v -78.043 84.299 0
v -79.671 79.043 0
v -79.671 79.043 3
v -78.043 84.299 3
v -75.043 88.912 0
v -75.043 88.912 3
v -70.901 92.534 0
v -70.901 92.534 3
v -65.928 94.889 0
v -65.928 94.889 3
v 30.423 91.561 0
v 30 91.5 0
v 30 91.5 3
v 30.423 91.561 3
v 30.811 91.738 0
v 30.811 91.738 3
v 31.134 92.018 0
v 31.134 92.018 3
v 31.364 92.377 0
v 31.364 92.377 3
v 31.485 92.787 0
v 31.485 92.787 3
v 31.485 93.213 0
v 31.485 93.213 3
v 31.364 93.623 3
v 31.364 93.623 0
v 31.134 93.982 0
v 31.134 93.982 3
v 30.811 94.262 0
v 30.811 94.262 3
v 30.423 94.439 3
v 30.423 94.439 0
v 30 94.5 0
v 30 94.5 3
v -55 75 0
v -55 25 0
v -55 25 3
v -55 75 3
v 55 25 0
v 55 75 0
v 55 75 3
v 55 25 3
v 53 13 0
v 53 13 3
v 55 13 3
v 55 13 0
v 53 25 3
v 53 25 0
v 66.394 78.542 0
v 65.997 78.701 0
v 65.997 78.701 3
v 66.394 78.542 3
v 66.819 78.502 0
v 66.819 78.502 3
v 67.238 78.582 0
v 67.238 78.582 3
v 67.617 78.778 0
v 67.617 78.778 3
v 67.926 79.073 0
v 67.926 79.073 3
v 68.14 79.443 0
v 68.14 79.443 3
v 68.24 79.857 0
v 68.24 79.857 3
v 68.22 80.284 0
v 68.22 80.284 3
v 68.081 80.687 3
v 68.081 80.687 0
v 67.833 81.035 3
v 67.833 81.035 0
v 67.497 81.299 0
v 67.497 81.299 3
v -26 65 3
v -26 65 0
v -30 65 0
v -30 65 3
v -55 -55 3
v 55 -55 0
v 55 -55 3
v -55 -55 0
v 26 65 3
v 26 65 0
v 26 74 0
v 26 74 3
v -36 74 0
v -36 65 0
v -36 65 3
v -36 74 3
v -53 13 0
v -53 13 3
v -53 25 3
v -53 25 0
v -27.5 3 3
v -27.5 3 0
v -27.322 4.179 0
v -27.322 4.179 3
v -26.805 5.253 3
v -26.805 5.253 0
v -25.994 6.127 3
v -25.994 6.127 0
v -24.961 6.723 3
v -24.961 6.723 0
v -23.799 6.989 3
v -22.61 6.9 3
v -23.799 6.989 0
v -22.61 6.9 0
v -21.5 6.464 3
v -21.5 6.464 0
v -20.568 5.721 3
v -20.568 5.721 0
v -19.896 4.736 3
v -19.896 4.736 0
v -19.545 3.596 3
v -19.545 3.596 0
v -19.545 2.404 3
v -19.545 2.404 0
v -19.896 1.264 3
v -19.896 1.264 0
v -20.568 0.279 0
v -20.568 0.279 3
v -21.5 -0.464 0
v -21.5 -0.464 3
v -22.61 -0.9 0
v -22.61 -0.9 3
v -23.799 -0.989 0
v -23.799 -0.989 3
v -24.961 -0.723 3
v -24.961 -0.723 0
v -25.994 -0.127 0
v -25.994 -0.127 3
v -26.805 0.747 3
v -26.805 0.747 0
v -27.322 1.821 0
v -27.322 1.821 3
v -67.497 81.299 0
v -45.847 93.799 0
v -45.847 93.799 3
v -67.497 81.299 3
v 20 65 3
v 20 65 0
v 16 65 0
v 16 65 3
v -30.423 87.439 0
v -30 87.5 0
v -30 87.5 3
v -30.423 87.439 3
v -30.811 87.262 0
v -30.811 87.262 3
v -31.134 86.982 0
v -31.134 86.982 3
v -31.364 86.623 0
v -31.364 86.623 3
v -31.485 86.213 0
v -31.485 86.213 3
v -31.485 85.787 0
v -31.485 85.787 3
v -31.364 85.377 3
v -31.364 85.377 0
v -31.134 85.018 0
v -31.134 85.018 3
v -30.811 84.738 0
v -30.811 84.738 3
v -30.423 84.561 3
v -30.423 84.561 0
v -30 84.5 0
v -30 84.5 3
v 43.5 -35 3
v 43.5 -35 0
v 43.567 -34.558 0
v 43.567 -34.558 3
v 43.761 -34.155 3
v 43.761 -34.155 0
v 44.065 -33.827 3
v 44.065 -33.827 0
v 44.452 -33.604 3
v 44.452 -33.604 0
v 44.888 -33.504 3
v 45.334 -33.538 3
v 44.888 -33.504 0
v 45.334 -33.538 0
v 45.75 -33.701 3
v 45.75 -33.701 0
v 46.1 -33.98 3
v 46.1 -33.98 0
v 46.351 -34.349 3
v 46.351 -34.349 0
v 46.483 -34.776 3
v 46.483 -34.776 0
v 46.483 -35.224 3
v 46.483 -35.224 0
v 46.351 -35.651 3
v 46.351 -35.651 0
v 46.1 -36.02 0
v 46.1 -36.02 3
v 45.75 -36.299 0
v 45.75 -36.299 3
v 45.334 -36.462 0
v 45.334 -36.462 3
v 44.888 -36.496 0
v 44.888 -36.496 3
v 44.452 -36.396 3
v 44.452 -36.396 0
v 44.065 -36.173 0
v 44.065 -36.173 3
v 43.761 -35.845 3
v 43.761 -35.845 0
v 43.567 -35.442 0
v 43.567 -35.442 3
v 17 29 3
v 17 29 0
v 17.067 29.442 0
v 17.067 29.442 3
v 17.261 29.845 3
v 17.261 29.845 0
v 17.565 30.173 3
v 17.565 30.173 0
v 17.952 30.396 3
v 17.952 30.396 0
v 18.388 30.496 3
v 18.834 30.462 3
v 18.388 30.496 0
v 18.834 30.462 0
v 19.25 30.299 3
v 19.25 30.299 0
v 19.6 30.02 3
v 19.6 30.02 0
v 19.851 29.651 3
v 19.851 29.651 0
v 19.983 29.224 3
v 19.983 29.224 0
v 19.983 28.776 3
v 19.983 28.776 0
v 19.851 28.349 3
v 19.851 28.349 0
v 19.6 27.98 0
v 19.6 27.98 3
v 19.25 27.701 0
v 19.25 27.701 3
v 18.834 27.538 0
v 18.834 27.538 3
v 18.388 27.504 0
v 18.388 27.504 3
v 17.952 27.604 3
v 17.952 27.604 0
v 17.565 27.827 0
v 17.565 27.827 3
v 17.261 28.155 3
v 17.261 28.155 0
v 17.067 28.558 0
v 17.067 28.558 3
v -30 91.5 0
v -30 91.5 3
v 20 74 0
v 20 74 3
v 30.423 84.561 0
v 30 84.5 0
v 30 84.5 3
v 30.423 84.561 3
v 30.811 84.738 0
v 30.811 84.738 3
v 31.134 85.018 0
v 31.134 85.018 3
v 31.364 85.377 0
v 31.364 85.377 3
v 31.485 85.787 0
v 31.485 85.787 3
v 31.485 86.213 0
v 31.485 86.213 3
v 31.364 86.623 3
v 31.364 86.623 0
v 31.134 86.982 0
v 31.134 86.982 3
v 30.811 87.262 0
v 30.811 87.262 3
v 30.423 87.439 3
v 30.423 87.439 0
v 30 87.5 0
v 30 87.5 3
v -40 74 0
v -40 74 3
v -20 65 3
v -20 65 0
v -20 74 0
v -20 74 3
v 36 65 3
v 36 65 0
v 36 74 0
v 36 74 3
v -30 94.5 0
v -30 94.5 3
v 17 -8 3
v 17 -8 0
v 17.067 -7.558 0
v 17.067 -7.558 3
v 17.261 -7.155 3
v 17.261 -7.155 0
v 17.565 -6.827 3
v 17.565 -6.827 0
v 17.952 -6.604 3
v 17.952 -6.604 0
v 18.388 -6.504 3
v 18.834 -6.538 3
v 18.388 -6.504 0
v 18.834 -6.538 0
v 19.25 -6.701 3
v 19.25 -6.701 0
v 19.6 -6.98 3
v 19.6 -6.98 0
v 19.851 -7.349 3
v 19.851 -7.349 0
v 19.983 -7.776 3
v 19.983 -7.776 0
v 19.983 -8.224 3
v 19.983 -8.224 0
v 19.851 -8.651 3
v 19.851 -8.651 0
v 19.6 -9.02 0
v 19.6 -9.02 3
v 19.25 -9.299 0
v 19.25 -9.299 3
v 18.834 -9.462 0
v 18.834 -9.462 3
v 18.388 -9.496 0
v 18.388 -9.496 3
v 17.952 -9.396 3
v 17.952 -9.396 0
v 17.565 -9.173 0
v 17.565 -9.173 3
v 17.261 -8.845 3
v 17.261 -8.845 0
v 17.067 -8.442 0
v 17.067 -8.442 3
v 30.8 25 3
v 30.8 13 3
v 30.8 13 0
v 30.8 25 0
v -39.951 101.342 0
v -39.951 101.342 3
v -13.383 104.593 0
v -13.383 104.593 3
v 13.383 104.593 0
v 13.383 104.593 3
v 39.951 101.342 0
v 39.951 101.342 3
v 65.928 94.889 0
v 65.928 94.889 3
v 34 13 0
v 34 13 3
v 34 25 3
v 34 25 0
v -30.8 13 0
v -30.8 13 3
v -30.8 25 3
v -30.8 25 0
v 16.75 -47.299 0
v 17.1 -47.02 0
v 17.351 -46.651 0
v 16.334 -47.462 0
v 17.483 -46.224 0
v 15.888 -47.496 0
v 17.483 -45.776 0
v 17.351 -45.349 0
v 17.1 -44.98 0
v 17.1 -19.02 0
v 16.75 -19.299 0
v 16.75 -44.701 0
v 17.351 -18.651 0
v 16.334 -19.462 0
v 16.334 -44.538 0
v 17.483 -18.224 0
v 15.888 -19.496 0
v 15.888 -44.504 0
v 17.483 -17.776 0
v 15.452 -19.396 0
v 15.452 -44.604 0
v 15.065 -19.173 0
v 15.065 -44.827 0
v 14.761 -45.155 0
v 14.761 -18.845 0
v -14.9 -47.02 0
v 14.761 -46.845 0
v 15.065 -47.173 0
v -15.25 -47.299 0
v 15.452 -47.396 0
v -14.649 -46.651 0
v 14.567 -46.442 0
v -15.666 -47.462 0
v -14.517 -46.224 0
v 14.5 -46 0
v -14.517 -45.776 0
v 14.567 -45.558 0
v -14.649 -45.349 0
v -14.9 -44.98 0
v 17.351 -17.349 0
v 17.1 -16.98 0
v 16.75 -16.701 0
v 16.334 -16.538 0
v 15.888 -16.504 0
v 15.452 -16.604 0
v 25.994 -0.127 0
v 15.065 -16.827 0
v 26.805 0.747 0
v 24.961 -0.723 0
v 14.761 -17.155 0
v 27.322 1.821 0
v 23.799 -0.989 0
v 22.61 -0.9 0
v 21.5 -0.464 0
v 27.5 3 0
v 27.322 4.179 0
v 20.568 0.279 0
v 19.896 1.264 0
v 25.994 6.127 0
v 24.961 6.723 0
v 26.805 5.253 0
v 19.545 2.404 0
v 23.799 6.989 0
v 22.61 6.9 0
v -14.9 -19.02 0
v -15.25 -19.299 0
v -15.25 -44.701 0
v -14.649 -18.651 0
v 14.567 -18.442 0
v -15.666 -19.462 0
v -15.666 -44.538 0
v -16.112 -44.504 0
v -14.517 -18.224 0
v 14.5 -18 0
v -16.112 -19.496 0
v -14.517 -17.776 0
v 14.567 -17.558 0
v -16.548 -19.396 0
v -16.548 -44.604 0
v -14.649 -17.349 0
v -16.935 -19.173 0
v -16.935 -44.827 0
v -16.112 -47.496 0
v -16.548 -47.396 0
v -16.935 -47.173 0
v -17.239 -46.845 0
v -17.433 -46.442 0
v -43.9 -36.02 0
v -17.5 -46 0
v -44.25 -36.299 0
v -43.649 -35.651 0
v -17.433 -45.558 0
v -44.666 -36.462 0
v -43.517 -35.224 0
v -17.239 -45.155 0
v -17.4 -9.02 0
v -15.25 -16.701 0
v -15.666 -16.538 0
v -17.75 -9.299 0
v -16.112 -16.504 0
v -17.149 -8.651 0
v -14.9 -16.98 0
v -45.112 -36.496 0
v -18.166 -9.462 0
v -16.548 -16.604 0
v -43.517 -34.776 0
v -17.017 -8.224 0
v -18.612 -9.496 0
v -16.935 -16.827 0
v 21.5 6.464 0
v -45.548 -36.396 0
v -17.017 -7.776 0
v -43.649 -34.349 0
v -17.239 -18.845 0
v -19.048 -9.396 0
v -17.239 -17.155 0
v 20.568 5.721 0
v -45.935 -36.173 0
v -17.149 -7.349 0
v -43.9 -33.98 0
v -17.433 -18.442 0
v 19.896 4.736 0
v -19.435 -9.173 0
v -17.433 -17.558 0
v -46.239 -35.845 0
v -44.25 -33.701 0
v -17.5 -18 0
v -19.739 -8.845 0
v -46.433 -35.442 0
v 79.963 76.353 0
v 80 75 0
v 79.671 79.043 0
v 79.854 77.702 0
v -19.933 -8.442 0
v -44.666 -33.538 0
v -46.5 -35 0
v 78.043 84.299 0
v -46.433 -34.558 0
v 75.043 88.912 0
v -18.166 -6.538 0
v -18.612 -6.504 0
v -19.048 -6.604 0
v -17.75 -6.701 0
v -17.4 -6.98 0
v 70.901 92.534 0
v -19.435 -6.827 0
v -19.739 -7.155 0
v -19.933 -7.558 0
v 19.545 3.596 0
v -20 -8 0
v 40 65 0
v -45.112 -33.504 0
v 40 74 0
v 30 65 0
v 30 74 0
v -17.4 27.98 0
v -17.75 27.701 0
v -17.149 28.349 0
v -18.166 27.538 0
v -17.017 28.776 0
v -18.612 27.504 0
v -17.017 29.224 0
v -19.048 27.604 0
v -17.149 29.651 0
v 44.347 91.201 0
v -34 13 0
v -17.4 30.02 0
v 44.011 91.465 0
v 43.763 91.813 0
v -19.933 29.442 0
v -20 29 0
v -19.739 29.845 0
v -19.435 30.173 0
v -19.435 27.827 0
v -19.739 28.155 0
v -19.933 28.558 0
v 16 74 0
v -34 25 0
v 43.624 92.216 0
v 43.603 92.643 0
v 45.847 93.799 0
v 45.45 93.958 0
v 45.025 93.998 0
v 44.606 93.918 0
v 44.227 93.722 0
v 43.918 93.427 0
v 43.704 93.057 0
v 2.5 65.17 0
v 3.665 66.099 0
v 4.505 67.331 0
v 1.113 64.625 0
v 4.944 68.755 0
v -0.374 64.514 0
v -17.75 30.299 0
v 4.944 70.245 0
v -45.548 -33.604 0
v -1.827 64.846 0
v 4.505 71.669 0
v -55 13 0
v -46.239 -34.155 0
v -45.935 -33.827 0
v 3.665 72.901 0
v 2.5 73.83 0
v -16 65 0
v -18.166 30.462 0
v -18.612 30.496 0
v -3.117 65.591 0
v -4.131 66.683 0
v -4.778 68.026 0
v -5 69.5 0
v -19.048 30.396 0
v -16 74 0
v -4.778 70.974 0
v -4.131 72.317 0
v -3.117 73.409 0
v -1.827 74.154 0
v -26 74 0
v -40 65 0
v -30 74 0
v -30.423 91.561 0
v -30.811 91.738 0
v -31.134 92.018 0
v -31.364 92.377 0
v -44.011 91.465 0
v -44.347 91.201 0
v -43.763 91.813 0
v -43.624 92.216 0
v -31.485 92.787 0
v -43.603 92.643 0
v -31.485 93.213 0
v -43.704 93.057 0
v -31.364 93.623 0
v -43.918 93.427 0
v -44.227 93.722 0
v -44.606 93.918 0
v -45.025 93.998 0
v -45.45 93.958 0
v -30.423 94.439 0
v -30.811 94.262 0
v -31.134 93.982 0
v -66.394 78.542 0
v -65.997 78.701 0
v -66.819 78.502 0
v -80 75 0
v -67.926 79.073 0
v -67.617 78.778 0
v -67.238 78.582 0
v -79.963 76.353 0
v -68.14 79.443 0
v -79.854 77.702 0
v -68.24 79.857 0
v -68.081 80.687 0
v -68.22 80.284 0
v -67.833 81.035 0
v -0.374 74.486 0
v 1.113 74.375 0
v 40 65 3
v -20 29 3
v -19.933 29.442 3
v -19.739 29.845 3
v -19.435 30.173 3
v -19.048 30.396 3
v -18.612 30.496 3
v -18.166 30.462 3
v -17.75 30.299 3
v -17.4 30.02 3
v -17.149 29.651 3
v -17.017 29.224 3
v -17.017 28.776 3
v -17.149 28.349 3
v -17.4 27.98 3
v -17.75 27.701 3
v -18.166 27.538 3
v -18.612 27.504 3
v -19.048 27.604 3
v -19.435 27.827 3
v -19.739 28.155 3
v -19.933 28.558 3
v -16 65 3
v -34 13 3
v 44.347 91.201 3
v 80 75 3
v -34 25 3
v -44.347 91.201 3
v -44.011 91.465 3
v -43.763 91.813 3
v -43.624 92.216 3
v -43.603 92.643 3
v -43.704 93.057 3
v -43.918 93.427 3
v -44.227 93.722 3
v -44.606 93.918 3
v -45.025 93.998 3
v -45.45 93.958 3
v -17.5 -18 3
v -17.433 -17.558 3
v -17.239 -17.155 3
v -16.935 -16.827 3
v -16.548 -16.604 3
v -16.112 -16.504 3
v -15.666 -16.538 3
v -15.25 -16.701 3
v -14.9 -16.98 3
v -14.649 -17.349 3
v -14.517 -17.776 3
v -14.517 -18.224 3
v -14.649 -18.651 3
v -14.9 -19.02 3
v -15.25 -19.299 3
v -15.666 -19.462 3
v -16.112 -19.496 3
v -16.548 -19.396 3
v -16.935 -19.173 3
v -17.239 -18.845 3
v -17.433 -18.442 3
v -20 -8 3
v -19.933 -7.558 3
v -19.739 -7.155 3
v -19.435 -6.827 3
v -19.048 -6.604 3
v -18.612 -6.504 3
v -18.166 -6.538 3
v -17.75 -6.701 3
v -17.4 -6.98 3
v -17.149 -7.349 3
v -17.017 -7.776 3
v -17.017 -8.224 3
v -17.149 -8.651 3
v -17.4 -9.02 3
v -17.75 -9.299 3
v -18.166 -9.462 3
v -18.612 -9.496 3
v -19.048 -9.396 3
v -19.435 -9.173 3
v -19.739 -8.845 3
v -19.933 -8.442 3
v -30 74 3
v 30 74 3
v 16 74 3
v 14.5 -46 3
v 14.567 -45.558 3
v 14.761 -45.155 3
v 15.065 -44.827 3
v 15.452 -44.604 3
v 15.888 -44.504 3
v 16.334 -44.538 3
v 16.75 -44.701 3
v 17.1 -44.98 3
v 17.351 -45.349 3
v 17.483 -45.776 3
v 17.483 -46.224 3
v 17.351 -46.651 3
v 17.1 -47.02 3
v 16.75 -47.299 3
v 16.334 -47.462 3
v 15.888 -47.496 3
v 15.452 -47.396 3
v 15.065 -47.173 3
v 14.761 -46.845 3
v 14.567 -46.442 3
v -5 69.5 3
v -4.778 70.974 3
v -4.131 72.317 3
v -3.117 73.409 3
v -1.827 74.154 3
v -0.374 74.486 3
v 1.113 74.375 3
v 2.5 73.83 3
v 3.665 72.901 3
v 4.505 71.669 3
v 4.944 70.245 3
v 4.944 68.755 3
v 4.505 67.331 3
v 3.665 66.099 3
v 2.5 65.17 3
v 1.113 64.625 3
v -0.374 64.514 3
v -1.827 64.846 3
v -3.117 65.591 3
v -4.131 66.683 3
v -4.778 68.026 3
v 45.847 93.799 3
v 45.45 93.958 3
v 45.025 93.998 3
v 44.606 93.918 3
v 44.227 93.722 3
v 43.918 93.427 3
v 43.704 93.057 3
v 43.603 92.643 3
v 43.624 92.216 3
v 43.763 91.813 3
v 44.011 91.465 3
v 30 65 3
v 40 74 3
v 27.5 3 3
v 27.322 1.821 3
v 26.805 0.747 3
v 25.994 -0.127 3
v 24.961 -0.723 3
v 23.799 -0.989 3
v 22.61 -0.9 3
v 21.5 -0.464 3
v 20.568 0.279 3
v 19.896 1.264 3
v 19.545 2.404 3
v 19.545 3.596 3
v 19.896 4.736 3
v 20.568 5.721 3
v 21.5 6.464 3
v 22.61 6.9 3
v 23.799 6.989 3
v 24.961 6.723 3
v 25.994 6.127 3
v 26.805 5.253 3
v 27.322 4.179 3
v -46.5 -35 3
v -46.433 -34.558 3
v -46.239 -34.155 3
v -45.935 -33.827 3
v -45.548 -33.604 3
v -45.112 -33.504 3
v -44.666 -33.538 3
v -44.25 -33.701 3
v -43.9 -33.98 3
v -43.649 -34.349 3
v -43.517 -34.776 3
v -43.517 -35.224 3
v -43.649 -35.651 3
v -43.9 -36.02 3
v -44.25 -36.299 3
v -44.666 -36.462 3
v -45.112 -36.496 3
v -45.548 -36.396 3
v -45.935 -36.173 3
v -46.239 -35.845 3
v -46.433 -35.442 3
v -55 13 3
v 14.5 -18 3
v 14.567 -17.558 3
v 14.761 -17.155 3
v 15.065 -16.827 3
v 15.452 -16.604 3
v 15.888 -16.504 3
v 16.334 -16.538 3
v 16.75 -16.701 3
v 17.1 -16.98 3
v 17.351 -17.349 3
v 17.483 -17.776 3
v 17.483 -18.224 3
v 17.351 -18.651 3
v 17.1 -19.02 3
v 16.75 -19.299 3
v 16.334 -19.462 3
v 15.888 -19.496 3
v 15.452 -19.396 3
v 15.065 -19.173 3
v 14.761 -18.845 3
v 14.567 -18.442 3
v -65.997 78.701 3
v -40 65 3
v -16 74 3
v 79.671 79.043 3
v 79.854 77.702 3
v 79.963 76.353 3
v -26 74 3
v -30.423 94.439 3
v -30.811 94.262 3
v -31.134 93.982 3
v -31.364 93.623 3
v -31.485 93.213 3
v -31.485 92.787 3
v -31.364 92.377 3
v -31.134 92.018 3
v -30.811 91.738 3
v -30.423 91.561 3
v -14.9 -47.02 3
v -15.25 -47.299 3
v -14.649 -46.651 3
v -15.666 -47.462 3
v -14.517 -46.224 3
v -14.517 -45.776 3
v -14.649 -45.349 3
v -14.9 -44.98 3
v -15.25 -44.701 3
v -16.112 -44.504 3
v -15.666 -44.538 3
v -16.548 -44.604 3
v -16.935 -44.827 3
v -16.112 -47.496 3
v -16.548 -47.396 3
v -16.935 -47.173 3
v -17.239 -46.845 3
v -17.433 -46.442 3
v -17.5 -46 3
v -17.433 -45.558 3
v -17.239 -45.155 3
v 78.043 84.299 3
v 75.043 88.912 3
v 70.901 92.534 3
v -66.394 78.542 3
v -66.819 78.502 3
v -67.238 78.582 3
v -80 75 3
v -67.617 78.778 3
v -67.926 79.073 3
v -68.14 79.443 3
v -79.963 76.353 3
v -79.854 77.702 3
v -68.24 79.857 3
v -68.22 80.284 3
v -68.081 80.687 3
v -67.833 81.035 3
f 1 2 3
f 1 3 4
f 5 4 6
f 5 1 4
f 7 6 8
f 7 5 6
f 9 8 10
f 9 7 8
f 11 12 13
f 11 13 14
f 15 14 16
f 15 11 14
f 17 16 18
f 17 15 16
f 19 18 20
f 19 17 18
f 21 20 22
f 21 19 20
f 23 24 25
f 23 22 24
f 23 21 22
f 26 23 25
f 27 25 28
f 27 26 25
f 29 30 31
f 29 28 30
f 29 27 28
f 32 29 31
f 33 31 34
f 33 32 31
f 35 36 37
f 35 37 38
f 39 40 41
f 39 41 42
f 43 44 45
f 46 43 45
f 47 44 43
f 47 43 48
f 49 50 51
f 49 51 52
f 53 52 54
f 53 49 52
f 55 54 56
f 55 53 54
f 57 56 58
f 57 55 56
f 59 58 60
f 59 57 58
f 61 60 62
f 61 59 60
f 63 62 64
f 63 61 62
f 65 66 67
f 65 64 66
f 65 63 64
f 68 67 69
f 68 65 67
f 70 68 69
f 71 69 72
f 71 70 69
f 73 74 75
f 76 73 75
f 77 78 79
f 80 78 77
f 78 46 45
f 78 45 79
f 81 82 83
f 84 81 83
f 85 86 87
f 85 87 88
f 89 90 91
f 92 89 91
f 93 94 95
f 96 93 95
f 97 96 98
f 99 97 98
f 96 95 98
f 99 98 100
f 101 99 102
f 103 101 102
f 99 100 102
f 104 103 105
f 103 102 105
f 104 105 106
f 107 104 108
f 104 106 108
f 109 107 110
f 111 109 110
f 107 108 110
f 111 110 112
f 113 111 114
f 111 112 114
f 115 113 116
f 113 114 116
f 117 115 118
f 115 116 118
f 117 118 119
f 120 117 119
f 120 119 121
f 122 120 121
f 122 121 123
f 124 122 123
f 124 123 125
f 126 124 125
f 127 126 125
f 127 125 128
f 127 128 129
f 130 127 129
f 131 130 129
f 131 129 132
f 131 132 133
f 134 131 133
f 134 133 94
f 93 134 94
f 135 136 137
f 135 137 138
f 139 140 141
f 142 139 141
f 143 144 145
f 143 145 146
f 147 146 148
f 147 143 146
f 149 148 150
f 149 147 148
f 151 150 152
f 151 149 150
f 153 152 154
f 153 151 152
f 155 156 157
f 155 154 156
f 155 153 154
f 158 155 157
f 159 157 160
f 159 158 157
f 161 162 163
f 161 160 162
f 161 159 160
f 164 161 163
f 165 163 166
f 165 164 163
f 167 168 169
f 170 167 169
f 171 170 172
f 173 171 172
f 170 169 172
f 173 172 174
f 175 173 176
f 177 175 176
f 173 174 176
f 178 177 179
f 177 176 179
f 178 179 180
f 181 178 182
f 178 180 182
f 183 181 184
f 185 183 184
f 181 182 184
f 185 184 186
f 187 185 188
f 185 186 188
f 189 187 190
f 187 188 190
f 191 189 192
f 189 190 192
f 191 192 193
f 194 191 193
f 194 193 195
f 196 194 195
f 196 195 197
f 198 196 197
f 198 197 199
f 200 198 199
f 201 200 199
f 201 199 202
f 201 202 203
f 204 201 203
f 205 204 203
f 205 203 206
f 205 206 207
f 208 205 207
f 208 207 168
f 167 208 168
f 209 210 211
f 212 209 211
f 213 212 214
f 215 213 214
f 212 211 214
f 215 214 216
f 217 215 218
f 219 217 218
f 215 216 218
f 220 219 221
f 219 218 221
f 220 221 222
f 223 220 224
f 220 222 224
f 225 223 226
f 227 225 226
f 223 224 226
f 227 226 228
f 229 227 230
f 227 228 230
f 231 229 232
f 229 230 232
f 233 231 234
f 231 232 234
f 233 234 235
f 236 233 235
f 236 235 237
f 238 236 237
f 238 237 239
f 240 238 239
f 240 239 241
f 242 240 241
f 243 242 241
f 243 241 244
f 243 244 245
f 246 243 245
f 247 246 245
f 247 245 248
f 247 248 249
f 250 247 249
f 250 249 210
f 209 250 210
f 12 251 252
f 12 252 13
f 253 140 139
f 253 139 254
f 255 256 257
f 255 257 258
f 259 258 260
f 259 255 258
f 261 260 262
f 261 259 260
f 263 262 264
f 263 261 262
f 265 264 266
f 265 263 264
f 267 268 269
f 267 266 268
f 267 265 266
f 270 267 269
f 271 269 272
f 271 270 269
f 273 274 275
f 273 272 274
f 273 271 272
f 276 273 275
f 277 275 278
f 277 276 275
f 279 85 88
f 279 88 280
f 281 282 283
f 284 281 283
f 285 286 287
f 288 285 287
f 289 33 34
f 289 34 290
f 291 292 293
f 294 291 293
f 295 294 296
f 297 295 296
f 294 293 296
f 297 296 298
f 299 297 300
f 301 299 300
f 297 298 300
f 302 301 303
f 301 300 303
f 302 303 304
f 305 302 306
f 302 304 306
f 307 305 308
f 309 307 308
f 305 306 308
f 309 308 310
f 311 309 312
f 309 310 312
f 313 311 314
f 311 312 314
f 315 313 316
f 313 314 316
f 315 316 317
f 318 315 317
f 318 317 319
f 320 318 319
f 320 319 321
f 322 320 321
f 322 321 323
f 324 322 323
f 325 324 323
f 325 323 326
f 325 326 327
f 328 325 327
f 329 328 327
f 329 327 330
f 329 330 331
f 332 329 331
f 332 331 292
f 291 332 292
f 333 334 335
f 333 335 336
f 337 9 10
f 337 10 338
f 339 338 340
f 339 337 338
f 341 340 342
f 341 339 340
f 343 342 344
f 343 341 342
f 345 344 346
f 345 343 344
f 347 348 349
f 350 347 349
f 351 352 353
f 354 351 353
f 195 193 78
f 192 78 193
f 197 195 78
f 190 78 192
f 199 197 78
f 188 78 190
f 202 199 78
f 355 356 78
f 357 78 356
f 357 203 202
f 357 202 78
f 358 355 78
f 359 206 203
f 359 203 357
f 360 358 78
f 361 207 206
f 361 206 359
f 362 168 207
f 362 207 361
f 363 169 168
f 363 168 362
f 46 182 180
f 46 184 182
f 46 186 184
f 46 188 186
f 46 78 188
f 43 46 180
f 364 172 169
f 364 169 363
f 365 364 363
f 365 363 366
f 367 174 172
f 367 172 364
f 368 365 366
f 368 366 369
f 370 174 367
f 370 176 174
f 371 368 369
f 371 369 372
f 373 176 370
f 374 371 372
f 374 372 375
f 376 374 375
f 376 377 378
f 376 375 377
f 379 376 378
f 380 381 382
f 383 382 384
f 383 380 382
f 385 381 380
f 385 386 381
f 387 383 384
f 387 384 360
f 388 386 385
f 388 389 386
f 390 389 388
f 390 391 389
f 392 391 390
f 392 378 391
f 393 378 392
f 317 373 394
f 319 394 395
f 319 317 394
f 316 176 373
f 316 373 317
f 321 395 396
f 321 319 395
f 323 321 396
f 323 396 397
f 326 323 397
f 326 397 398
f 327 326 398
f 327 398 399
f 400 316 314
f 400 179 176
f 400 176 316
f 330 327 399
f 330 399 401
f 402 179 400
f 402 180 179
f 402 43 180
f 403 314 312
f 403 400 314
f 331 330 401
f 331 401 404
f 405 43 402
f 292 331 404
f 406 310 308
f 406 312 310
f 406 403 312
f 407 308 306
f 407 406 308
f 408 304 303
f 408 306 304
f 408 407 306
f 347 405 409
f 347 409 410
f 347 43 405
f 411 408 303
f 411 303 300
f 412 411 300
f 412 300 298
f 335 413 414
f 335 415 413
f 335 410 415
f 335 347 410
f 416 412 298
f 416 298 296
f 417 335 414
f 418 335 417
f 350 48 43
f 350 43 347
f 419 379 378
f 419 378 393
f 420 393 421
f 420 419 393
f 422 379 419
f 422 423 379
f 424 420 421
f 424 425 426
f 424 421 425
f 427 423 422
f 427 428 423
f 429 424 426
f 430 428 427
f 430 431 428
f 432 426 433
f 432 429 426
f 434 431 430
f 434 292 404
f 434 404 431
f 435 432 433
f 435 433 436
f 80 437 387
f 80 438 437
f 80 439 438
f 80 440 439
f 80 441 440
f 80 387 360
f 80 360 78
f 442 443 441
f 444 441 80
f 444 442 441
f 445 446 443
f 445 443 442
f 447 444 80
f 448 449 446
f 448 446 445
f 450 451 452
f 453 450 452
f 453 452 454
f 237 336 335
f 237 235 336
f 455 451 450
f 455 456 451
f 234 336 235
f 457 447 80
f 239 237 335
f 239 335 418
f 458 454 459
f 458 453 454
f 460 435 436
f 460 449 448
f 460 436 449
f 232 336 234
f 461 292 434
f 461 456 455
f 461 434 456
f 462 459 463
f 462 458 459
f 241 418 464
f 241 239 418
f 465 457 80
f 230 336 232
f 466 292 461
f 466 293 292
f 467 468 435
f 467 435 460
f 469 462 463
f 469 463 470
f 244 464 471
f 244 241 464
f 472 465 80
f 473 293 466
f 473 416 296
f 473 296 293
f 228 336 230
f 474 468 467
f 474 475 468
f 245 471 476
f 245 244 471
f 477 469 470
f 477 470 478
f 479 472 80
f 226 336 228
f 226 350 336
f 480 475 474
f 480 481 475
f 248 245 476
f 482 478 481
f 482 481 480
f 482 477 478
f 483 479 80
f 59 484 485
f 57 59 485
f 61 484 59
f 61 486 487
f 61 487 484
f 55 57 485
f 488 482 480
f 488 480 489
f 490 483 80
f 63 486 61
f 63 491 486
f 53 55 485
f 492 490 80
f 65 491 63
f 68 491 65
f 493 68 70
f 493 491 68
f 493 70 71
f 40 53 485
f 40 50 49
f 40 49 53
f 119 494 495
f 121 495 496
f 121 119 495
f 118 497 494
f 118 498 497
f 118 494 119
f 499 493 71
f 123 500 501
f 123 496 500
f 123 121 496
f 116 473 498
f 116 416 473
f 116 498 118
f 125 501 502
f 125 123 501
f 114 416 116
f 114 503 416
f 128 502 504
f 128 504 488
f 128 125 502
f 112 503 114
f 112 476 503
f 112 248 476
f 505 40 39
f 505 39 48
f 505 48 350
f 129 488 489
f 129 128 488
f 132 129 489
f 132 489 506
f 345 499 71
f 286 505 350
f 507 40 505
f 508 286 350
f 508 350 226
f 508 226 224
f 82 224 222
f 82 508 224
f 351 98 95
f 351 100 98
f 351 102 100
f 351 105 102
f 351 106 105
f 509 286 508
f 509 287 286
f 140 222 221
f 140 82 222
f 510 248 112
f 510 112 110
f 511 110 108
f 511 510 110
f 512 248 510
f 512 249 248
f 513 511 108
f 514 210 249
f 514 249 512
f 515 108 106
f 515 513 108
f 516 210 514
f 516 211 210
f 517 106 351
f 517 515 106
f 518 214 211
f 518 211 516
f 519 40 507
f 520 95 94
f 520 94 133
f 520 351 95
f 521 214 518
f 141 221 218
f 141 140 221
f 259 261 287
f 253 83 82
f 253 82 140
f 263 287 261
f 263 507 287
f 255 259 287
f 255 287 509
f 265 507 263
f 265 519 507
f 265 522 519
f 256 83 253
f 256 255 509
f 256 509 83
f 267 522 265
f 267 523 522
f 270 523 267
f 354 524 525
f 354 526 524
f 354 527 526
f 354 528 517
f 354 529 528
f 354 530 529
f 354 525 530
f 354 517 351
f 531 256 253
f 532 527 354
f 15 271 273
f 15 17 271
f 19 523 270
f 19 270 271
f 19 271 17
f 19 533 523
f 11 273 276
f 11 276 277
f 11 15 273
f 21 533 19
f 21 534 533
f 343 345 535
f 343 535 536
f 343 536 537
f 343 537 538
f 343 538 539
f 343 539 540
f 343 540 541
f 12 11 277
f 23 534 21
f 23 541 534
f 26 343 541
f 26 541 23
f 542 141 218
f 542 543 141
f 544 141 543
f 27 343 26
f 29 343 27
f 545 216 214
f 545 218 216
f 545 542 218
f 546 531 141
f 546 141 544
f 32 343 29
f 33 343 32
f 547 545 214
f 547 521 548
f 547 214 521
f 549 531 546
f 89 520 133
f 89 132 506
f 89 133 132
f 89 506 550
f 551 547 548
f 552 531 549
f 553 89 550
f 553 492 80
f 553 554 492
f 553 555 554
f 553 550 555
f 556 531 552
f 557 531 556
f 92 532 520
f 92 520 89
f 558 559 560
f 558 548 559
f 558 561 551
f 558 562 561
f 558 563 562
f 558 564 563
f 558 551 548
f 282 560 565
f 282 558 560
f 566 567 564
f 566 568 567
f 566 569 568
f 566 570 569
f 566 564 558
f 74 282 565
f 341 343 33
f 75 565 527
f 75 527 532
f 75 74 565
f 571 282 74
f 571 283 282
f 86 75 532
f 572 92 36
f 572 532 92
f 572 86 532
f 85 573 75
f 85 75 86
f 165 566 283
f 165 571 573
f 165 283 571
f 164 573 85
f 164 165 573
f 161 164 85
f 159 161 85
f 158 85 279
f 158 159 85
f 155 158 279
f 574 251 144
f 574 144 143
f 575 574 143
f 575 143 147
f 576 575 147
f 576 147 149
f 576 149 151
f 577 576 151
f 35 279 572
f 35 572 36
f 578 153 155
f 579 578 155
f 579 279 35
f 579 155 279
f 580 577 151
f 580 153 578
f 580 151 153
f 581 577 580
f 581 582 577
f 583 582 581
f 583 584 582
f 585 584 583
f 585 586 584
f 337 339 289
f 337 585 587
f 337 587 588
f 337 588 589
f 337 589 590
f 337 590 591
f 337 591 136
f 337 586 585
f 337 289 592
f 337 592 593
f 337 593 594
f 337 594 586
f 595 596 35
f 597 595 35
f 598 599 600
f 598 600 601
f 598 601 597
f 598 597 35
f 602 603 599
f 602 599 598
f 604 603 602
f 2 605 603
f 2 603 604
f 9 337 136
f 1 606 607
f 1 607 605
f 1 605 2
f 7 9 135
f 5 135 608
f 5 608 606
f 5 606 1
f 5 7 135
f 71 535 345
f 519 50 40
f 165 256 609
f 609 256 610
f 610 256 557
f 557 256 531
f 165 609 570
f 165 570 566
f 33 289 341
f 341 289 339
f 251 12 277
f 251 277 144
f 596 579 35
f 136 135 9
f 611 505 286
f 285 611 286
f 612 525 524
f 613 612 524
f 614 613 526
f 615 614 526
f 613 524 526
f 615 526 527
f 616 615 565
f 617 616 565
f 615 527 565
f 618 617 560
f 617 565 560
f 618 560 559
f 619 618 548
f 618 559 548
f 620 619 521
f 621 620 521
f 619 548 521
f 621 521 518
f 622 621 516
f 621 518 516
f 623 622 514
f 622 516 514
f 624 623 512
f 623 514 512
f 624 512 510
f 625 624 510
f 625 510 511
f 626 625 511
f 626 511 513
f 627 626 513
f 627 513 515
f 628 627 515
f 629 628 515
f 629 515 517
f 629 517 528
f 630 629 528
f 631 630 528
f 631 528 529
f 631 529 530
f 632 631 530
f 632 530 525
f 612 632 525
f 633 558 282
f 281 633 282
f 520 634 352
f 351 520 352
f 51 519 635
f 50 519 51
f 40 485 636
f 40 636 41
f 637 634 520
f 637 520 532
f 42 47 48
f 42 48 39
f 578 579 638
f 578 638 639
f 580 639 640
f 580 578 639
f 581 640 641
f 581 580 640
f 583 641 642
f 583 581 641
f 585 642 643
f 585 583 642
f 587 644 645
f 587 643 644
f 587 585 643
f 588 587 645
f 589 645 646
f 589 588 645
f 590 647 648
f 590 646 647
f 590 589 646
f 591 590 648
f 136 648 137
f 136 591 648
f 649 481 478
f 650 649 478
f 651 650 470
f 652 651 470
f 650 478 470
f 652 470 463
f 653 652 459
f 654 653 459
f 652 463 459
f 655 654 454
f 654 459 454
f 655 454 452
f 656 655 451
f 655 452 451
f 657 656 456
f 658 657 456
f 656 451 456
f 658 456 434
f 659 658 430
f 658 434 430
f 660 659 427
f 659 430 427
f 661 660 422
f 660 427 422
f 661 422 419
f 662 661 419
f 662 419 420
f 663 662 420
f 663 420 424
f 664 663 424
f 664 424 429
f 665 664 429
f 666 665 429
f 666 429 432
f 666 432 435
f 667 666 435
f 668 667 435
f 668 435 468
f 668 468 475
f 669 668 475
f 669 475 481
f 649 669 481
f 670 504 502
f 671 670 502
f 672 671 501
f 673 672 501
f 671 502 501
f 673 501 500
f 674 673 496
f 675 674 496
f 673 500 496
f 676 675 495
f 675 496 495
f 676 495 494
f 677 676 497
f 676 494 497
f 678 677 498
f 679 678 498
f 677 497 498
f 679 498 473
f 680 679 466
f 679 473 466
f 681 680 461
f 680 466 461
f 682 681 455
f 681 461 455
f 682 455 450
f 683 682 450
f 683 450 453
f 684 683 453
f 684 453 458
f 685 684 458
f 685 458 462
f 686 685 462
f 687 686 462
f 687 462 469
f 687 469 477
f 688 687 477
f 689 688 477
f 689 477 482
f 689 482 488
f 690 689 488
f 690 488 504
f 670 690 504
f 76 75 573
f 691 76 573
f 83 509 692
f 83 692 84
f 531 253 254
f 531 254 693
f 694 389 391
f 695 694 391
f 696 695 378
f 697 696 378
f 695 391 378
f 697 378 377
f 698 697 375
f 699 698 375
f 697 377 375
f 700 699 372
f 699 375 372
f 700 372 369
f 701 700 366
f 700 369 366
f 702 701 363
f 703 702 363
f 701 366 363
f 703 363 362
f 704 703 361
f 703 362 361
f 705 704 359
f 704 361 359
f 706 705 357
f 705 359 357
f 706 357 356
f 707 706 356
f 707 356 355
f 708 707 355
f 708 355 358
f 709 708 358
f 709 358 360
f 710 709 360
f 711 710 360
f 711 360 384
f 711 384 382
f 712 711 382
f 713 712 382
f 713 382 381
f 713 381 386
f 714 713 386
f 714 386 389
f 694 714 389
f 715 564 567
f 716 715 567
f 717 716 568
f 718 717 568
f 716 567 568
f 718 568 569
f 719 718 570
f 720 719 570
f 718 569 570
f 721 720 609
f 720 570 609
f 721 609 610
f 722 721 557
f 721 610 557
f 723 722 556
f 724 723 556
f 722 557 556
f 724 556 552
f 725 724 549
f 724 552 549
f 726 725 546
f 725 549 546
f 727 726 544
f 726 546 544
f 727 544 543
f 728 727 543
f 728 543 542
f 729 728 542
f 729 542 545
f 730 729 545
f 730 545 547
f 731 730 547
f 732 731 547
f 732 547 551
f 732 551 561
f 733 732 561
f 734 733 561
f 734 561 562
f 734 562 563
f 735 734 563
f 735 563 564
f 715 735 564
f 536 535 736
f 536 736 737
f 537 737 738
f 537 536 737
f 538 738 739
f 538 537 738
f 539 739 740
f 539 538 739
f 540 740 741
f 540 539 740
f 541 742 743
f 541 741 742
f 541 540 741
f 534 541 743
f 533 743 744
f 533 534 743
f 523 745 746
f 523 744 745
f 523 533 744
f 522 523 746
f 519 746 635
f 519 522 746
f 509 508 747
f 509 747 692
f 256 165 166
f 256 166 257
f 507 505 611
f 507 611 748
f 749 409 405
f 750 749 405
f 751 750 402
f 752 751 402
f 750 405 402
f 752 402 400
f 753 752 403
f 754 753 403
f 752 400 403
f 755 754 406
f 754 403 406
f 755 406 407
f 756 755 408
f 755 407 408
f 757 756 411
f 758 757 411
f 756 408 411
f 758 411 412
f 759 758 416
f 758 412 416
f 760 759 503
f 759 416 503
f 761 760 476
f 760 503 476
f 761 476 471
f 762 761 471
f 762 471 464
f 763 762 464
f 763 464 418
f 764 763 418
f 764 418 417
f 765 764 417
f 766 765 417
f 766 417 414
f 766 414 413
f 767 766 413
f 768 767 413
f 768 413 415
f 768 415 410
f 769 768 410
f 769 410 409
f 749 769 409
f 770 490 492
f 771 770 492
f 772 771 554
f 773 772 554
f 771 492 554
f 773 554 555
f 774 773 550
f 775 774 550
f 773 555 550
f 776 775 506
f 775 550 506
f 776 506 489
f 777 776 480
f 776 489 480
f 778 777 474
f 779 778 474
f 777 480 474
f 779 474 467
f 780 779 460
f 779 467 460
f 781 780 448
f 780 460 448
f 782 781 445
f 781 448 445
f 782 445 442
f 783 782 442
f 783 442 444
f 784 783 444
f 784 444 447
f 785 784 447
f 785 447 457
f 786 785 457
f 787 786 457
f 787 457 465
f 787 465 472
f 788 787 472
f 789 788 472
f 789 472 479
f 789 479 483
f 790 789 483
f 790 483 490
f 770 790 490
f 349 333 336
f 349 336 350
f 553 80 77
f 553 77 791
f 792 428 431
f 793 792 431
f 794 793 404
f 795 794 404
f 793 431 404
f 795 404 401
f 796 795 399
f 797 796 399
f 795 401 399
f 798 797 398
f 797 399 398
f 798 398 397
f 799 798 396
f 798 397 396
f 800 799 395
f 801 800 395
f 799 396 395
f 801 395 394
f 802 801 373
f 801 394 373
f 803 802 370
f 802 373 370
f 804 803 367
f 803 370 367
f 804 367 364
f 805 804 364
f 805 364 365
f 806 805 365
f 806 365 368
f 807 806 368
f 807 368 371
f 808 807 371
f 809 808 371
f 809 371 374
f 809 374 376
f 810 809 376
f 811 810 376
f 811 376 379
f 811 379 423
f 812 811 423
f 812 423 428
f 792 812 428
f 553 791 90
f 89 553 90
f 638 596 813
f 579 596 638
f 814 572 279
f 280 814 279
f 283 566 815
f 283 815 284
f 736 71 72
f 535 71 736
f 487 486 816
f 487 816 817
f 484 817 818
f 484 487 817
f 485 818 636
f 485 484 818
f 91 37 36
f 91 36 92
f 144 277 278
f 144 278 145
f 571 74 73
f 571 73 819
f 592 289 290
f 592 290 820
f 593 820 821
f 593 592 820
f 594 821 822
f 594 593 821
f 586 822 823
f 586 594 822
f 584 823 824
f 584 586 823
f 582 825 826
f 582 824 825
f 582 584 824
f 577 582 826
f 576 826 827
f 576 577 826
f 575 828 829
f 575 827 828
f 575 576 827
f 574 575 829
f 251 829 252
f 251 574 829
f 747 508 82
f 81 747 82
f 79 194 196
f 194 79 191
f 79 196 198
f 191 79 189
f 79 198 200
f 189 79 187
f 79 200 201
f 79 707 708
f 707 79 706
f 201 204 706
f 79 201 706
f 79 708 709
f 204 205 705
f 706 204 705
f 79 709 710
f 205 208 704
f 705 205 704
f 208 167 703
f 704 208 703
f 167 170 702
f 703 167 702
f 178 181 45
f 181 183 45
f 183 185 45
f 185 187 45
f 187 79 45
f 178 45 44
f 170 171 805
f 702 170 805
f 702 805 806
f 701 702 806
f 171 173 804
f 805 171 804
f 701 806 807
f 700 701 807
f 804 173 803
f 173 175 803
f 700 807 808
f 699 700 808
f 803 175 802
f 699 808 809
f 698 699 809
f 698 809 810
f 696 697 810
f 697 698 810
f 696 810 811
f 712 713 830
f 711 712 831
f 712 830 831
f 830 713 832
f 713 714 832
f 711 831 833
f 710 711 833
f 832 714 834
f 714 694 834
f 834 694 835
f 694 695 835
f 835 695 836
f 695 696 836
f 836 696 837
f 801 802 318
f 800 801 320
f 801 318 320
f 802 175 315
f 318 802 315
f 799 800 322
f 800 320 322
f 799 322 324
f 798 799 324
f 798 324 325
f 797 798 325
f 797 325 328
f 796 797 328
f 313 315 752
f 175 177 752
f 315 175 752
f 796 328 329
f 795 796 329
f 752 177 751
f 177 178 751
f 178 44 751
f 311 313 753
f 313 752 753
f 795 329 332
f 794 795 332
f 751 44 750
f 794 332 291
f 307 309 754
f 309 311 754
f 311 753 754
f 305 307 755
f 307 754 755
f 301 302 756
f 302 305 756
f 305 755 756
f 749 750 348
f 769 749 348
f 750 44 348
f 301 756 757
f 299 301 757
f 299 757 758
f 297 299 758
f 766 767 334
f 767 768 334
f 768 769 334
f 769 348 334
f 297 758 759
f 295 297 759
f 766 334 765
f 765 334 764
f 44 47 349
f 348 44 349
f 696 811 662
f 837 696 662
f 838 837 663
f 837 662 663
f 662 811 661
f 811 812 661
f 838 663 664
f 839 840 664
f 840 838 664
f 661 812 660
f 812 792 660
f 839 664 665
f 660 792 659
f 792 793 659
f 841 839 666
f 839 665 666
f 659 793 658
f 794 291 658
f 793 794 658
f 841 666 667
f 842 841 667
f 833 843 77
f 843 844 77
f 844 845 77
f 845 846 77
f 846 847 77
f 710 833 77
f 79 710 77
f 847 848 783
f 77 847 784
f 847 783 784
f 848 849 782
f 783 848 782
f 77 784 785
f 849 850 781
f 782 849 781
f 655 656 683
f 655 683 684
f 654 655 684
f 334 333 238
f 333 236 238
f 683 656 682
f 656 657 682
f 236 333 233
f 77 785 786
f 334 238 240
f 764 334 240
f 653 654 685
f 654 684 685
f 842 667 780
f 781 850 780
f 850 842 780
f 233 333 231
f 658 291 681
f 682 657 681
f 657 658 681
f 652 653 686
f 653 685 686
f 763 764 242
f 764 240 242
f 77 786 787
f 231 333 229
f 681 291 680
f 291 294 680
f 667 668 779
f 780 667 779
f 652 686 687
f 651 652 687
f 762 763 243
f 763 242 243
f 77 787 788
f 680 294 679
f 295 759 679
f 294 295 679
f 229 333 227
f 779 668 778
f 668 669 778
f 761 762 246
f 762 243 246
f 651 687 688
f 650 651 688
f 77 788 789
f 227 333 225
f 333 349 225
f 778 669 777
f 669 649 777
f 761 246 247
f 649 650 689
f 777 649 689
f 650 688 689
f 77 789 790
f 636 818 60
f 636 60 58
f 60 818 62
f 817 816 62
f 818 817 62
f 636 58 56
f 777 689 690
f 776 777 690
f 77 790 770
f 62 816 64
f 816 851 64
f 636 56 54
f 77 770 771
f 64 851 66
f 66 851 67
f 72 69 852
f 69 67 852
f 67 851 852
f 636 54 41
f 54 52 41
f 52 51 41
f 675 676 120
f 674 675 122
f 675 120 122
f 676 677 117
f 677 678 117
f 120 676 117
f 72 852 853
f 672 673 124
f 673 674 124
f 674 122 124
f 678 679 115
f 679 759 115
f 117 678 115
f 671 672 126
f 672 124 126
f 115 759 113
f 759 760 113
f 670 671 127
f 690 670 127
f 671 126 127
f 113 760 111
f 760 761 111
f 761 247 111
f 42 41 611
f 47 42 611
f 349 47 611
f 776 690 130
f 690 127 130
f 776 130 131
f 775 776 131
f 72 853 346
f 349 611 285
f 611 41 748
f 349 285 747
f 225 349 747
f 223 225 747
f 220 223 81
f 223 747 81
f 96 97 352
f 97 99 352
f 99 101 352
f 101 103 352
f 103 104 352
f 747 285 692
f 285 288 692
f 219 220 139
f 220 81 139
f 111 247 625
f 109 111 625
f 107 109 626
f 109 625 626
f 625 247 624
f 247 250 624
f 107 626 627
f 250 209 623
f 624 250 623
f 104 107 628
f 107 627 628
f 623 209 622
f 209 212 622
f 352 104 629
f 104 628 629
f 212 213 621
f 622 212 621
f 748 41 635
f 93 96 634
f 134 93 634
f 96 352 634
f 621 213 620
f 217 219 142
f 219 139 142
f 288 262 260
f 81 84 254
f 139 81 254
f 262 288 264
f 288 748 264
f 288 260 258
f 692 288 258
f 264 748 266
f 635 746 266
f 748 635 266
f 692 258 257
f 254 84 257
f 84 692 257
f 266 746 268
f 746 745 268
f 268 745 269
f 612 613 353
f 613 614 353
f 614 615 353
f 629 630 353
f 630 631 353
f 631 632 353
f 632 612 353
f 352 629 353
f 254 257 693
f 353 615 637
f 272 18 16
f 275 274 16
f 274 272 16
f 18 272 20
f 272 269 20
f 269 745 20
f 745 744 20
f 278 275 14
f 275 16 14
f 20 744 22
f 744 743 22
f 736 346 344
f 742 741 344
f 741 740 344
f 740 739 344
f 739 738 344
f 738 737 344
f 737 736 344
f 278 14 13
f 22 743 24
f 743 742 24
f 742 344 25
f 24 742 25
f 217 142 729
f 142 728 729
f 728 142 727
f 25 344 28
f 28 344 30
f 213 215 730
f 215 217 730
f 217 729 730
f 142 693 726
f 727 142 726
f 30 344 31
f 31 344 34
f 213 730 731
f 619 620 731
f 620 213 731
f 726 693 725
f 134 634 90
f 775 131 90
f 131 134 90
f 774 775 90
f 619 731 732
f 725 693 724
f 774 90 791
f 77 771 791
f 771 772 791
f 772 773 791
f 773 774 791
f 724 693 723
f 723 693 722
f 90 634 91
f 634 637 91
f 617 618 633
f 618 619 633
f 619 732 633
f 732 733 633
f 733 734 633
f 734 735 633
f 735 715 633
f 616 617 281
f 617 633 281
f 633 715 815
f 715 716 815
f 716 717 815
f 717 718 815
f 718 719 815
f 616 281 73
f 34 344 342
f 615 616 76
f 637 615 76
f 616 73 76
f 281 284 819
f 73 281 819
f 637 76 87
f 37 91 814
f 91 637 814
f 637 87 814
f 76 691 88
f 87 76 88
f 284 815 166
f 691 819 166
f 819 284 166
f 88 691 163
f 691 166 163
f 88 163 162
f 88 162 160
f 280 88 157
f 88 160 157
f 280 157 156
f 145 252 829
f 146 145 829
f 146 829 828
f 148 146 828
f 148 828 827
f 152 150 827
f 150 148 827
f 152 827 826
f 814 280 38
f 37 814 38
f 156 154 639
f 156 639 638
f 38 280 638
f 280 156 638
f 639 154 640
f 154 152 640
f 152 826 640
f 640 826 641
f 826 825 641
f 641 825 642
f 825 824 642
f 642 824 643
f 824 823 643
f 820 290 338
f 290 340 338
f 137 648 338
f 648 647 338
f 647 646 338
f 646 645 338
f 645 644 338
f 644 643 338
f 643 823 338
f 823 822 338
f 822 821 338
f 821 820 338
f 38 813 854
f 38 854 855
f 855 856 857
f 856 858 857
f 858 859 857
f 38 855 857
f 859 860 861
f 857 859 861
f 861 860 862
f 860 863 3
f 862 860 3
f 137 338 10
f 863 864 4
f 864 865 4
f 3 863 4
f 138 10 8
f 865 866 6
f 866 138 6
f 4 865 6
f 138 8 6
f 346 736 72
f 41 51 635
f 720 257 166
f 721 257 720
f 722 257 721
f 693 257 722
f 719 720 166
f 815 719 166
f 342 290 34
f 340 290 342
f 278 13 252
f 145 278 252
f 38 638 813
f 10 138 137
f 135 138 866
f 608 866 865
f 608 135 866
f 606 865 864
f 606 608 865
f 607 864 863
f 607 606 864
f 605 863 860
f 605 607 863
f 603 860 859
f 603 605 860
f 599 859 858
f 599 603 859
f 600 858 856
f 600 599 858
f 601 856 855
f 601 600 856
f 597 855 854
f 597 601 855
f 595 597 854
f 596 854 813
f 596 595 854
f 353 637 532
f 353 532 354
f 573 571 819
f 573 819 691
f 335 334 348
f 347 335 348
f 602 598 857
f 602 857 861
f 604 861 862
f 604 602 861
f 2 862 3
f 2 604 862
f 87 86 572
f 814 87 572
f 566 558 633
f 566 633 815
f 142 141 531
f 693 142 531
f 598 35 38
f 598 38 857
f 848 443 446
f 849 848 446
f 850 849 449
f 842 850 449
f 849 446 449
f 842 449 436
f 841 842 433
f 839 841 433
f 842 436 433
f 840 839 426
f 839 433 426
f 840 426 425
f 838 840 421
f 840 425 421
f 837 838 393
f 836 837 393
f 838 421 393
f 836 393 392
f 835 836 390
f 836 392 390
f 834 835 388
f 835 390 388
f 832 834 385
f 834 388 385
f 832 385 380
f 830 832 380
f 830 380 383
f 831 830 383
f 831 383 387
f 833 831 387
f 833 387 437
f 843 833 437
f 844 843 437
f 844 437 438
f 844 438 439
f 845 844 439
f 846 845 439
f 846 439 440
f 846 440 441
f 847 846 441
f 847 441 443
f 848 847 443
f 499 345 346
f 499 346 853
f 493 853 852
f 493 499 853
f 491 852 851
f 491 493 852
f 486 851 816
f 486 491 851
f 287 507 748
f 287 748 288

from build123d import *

# Parameters (mm, degrees)
EXTRUDE_1_DEPTH     = 3
CUT_EXTRUDE_1_DEPTH = 133.037873355
SKETCH_3_W          = 2
SKETCH_3_H          = 12
SKETCH_3_W_2        = 3.2
CUT_EXTRUDE_2_DEPTH = 133.037873355
SKETCH_4_R          = 4
CUT_EXTRUDE_3_DEPTH = 133.037873355
SKETCH_5_R          = 5
SKETCH_5_W          = 4
SKETCH_5_H          = 9
CUT_EXTRUDE_4_DEPTH = 133.037873355
SKETCH_6_R          = 1.5
CUT_EXTRUDE_5_DEPTH = 10
SKETCH_8_R          = 1.5
CUT_EXTRUDE_7_DEPTH = 133.037873355
SKETCH_9_R          = 1.5
CUT_EXTRUDE_8_DEPTH = 133.037873355


with BuildPart() as part:
    # 草图1 → 凸台-拉伸1 (new body)
    with BuildSketch(Plane.XY):
        with BuildLine():
            Line((55, -55), (-55, -55))
            Line((-55, -55), (-55, 75))
            Line((-55, 75), (-80, 75))
            ThreePointArc((-80, 75), (-79.917609458, 77.027988882), (-79.670980888, 79.042610796))
            ThreePointArc((-79.670980888, 79.042610796), (-75.043492411, 88.912306625), (-65.927615795, 94.889374375))
            ThreePointArc((-65.927615795, 94.889374375), (0, 105), (65.927615795, 94.889374375))
            ThreePointArc((65.927615795, 94.889374375), (75.043492411, 88.912306625), (79.670980888, 79.042610796))
            ThreePointArc((79.670980888, 79.042610796), (79.917609458, 77.027988882), (80, 75))
            Line((80, 75), (55, 75))
            Line((55, 75), (55, -55))
        make_face()
    extrude(amount=EXTRUDE_1_DEPTH)

    # 草图2 → 切除-拉伸1 (cut, through all)
    with BuildSketch(Plane(origin=(0, 0, 0), x_dir=(-1, 0, 0), z_dir=(0, 0, -1))):
        with BuildLine():
            Line((-30, 94.5), (30, 94.5))
            ThreePointArc((30, 94.5), (31.5, 93), (30, 91.5))
            Line((30, 91.5), (-30, 91.5))
            ThreePointArc((-30, 91.5), (-31.5, 93), (-30, 94.5))
        make_face()
        with BuildLine():
            Line((-67.497284367, 81.299038106), (-45.846649273, 93.799038106))
            ThreePointArc((-45.846649273, 93.799038106), (-43.797611167, 93.25), (-44.346649273, 91.200961894))
            Line((-44.346649273, 91.200961894), (-65.997284367, 78.700961894))
            ThreePointArc((-65.997284367, 78.700961894), (-68.046322473, 79.25), (-67.497284367, 81.299038106))
        make_face()
        with BuildLine():
            Line((65.997284367, 78.700961894), (44.346649273, 91.200961894))
            ThreePointArc((44.346649273, 91.200961894), (43.797611167, 93.25), (45.846649273, 93.799038106))
            Line((45.846649273, 93.799038106), (67.497284367, 81.299038106))
            ThreePointArc((67.497284367, 81.299038106), (68.046322473, 79.25), (65.997284367, 78.700961894))
        make_face()
        with BuildLine():
            Line((-30, 87.5), (30, 87.5))
            ThreePointArc((30, 87.5), (31.5, 86), (30, 84.5))
            Line((30, 84.5), (-30, 84.5))
            ThreePointArc((-30, 84.5), (-31.5, 86), (-30, 87.5))
        make_face()
    extrude(amount=-CUT_EXTRUDE_1_DEPTH, mode=Mode.SUBTRACT)

    # 草图3 → 切除-拉伸2 (cut, through all)
    with BuildSketch(Plane.XY.offset(3)):
        with Locations((-54, 19)):
            Rectangle(SKETCH_3_W, SKETCH_3_H)
        with Locations((-32.4, 19)):
            Rectangle(SKETCH_3_W_2, SKETCH_3_H)
        with Locations((32.4, 19)):
            Rectangle(SKETCH_3_W_2, SKETCH_3_H)
        with Locations((54, 19)):
            Rectangle(SKETCH_3_W, SKETCH_3_H)
    extrude(amount=-CUT_EXTRUDE_2_DEPTH, mode=Mode.SUBTRACT)

    # 草图4 → 切除-拉伸3 (cut, through all)
    with BuildSketch(Plane(origin=(0, 0, 0), x_dir=(-1, 0, 0), z_dir=(0, 0, -1))):
        with Locations((23.5, 3)):
            Circle(SKETCH_4_R)
        with Locations(Location((-23.5, 3, 0), (0, 0, 180))):
            Circle(SKETCH_4_R)
    extrude(amount=-CUT_EXTRUDE_3_DEPTH, mode=Mode.SUBTRACT)

    # 草图5 → 切除-拉伸4 (cut, through all)
    with BuildSketch(Plane(origin=(0, 0, 0), x_dir=(-1, 0, 0), z_dir=(0, 0, -1))):
        with Locations((0, 69.5)):
            Circle(SKETCH_5_R)
        with Locations((-38, 69.5)):
            Rectangle(SKETCH_5_W, SKETCH_5_H)
        with Locations((-28, 69.5)):
            Rectangle(SKETCH_5_W, SKETCH_5_H)
        with Locations((-18, 69.5)):
            Rectangle(SKETCH_5_W, SKETCH_5_H)
        with Locations((18, 69.5)):
            Rectangle(SKETCH_5_W, SKETCH_5_H)
        with Locations((28, 69.5)):
            Rectangle(SKETCH_5_W, SKETCH_5_H)
        with Locations((38, 69.5)):
            Rectangle(SKETCH_5_W, SKETCH_5_H)
    extrude(amount=-CUT_EXTRUDE_4_DEPTH, mode=Mode.SUBTRACT)

    # 草图6 → 切除-拉伸5 (cut)
    with BuildSketch(Plane(origin=(0, 0, 0), x_dir=(-1, 0, 0), z_dir=(0, 0, -1))):
        with Locations((18.5, 29)):
            Circle(SKETCH_6_R)
        with Locations((18.5, -8)):
            Circle(SKETCH_6_R)
        with Locations((-18.5, -8)):
            Circle(SKETCH_6_R)
        with Locations((-18.5, 29)):
            Circle(SKETCH_6_R)
    extrude(amount=-CUT_EXTRUDE_5_DEPTH, mode=Mode.SUBTRACT)

    # 草图8 → 切除-拉伸7 (cut, through all)
    with BuildSketch(Plane(origin=(0, 0, 0), x_dir=(-1, 0, 0), z_dir=(0, 0, -1))):
        with Locations((-16, -46)):
            Circle(SKETCH_8_R)
        with Locations((-16, -18)):
            Circle(SKETCH_8_R)
        with Locations((16, -18)):
            Circle(SKETCH_8_R)
        with Locations((16, -46)):
            Circle(SKETCH_8_R)
    extrude(amount=-CUT_EXTRUDE_7_DEPTH, mode=Mode.SUBTRACT)

    # 草图9 → 切除-拉伸8 (cut, through all)
    with BuildSketch(Plane(origin=(0, 0, 0), x_dir=(-1, 0, 0), z_dir=(0, 0, -1))):
        with Locations((-45, -35)):
            Circle(SKETCH_9_R)
        with Locations((45, -35)):
            Circle(SKETCH_9_R)
    extrude(amount=-CUT_EXTRUDE_8_DEPTH, mode=Mode.SUBTRACT)


solid = part.part
